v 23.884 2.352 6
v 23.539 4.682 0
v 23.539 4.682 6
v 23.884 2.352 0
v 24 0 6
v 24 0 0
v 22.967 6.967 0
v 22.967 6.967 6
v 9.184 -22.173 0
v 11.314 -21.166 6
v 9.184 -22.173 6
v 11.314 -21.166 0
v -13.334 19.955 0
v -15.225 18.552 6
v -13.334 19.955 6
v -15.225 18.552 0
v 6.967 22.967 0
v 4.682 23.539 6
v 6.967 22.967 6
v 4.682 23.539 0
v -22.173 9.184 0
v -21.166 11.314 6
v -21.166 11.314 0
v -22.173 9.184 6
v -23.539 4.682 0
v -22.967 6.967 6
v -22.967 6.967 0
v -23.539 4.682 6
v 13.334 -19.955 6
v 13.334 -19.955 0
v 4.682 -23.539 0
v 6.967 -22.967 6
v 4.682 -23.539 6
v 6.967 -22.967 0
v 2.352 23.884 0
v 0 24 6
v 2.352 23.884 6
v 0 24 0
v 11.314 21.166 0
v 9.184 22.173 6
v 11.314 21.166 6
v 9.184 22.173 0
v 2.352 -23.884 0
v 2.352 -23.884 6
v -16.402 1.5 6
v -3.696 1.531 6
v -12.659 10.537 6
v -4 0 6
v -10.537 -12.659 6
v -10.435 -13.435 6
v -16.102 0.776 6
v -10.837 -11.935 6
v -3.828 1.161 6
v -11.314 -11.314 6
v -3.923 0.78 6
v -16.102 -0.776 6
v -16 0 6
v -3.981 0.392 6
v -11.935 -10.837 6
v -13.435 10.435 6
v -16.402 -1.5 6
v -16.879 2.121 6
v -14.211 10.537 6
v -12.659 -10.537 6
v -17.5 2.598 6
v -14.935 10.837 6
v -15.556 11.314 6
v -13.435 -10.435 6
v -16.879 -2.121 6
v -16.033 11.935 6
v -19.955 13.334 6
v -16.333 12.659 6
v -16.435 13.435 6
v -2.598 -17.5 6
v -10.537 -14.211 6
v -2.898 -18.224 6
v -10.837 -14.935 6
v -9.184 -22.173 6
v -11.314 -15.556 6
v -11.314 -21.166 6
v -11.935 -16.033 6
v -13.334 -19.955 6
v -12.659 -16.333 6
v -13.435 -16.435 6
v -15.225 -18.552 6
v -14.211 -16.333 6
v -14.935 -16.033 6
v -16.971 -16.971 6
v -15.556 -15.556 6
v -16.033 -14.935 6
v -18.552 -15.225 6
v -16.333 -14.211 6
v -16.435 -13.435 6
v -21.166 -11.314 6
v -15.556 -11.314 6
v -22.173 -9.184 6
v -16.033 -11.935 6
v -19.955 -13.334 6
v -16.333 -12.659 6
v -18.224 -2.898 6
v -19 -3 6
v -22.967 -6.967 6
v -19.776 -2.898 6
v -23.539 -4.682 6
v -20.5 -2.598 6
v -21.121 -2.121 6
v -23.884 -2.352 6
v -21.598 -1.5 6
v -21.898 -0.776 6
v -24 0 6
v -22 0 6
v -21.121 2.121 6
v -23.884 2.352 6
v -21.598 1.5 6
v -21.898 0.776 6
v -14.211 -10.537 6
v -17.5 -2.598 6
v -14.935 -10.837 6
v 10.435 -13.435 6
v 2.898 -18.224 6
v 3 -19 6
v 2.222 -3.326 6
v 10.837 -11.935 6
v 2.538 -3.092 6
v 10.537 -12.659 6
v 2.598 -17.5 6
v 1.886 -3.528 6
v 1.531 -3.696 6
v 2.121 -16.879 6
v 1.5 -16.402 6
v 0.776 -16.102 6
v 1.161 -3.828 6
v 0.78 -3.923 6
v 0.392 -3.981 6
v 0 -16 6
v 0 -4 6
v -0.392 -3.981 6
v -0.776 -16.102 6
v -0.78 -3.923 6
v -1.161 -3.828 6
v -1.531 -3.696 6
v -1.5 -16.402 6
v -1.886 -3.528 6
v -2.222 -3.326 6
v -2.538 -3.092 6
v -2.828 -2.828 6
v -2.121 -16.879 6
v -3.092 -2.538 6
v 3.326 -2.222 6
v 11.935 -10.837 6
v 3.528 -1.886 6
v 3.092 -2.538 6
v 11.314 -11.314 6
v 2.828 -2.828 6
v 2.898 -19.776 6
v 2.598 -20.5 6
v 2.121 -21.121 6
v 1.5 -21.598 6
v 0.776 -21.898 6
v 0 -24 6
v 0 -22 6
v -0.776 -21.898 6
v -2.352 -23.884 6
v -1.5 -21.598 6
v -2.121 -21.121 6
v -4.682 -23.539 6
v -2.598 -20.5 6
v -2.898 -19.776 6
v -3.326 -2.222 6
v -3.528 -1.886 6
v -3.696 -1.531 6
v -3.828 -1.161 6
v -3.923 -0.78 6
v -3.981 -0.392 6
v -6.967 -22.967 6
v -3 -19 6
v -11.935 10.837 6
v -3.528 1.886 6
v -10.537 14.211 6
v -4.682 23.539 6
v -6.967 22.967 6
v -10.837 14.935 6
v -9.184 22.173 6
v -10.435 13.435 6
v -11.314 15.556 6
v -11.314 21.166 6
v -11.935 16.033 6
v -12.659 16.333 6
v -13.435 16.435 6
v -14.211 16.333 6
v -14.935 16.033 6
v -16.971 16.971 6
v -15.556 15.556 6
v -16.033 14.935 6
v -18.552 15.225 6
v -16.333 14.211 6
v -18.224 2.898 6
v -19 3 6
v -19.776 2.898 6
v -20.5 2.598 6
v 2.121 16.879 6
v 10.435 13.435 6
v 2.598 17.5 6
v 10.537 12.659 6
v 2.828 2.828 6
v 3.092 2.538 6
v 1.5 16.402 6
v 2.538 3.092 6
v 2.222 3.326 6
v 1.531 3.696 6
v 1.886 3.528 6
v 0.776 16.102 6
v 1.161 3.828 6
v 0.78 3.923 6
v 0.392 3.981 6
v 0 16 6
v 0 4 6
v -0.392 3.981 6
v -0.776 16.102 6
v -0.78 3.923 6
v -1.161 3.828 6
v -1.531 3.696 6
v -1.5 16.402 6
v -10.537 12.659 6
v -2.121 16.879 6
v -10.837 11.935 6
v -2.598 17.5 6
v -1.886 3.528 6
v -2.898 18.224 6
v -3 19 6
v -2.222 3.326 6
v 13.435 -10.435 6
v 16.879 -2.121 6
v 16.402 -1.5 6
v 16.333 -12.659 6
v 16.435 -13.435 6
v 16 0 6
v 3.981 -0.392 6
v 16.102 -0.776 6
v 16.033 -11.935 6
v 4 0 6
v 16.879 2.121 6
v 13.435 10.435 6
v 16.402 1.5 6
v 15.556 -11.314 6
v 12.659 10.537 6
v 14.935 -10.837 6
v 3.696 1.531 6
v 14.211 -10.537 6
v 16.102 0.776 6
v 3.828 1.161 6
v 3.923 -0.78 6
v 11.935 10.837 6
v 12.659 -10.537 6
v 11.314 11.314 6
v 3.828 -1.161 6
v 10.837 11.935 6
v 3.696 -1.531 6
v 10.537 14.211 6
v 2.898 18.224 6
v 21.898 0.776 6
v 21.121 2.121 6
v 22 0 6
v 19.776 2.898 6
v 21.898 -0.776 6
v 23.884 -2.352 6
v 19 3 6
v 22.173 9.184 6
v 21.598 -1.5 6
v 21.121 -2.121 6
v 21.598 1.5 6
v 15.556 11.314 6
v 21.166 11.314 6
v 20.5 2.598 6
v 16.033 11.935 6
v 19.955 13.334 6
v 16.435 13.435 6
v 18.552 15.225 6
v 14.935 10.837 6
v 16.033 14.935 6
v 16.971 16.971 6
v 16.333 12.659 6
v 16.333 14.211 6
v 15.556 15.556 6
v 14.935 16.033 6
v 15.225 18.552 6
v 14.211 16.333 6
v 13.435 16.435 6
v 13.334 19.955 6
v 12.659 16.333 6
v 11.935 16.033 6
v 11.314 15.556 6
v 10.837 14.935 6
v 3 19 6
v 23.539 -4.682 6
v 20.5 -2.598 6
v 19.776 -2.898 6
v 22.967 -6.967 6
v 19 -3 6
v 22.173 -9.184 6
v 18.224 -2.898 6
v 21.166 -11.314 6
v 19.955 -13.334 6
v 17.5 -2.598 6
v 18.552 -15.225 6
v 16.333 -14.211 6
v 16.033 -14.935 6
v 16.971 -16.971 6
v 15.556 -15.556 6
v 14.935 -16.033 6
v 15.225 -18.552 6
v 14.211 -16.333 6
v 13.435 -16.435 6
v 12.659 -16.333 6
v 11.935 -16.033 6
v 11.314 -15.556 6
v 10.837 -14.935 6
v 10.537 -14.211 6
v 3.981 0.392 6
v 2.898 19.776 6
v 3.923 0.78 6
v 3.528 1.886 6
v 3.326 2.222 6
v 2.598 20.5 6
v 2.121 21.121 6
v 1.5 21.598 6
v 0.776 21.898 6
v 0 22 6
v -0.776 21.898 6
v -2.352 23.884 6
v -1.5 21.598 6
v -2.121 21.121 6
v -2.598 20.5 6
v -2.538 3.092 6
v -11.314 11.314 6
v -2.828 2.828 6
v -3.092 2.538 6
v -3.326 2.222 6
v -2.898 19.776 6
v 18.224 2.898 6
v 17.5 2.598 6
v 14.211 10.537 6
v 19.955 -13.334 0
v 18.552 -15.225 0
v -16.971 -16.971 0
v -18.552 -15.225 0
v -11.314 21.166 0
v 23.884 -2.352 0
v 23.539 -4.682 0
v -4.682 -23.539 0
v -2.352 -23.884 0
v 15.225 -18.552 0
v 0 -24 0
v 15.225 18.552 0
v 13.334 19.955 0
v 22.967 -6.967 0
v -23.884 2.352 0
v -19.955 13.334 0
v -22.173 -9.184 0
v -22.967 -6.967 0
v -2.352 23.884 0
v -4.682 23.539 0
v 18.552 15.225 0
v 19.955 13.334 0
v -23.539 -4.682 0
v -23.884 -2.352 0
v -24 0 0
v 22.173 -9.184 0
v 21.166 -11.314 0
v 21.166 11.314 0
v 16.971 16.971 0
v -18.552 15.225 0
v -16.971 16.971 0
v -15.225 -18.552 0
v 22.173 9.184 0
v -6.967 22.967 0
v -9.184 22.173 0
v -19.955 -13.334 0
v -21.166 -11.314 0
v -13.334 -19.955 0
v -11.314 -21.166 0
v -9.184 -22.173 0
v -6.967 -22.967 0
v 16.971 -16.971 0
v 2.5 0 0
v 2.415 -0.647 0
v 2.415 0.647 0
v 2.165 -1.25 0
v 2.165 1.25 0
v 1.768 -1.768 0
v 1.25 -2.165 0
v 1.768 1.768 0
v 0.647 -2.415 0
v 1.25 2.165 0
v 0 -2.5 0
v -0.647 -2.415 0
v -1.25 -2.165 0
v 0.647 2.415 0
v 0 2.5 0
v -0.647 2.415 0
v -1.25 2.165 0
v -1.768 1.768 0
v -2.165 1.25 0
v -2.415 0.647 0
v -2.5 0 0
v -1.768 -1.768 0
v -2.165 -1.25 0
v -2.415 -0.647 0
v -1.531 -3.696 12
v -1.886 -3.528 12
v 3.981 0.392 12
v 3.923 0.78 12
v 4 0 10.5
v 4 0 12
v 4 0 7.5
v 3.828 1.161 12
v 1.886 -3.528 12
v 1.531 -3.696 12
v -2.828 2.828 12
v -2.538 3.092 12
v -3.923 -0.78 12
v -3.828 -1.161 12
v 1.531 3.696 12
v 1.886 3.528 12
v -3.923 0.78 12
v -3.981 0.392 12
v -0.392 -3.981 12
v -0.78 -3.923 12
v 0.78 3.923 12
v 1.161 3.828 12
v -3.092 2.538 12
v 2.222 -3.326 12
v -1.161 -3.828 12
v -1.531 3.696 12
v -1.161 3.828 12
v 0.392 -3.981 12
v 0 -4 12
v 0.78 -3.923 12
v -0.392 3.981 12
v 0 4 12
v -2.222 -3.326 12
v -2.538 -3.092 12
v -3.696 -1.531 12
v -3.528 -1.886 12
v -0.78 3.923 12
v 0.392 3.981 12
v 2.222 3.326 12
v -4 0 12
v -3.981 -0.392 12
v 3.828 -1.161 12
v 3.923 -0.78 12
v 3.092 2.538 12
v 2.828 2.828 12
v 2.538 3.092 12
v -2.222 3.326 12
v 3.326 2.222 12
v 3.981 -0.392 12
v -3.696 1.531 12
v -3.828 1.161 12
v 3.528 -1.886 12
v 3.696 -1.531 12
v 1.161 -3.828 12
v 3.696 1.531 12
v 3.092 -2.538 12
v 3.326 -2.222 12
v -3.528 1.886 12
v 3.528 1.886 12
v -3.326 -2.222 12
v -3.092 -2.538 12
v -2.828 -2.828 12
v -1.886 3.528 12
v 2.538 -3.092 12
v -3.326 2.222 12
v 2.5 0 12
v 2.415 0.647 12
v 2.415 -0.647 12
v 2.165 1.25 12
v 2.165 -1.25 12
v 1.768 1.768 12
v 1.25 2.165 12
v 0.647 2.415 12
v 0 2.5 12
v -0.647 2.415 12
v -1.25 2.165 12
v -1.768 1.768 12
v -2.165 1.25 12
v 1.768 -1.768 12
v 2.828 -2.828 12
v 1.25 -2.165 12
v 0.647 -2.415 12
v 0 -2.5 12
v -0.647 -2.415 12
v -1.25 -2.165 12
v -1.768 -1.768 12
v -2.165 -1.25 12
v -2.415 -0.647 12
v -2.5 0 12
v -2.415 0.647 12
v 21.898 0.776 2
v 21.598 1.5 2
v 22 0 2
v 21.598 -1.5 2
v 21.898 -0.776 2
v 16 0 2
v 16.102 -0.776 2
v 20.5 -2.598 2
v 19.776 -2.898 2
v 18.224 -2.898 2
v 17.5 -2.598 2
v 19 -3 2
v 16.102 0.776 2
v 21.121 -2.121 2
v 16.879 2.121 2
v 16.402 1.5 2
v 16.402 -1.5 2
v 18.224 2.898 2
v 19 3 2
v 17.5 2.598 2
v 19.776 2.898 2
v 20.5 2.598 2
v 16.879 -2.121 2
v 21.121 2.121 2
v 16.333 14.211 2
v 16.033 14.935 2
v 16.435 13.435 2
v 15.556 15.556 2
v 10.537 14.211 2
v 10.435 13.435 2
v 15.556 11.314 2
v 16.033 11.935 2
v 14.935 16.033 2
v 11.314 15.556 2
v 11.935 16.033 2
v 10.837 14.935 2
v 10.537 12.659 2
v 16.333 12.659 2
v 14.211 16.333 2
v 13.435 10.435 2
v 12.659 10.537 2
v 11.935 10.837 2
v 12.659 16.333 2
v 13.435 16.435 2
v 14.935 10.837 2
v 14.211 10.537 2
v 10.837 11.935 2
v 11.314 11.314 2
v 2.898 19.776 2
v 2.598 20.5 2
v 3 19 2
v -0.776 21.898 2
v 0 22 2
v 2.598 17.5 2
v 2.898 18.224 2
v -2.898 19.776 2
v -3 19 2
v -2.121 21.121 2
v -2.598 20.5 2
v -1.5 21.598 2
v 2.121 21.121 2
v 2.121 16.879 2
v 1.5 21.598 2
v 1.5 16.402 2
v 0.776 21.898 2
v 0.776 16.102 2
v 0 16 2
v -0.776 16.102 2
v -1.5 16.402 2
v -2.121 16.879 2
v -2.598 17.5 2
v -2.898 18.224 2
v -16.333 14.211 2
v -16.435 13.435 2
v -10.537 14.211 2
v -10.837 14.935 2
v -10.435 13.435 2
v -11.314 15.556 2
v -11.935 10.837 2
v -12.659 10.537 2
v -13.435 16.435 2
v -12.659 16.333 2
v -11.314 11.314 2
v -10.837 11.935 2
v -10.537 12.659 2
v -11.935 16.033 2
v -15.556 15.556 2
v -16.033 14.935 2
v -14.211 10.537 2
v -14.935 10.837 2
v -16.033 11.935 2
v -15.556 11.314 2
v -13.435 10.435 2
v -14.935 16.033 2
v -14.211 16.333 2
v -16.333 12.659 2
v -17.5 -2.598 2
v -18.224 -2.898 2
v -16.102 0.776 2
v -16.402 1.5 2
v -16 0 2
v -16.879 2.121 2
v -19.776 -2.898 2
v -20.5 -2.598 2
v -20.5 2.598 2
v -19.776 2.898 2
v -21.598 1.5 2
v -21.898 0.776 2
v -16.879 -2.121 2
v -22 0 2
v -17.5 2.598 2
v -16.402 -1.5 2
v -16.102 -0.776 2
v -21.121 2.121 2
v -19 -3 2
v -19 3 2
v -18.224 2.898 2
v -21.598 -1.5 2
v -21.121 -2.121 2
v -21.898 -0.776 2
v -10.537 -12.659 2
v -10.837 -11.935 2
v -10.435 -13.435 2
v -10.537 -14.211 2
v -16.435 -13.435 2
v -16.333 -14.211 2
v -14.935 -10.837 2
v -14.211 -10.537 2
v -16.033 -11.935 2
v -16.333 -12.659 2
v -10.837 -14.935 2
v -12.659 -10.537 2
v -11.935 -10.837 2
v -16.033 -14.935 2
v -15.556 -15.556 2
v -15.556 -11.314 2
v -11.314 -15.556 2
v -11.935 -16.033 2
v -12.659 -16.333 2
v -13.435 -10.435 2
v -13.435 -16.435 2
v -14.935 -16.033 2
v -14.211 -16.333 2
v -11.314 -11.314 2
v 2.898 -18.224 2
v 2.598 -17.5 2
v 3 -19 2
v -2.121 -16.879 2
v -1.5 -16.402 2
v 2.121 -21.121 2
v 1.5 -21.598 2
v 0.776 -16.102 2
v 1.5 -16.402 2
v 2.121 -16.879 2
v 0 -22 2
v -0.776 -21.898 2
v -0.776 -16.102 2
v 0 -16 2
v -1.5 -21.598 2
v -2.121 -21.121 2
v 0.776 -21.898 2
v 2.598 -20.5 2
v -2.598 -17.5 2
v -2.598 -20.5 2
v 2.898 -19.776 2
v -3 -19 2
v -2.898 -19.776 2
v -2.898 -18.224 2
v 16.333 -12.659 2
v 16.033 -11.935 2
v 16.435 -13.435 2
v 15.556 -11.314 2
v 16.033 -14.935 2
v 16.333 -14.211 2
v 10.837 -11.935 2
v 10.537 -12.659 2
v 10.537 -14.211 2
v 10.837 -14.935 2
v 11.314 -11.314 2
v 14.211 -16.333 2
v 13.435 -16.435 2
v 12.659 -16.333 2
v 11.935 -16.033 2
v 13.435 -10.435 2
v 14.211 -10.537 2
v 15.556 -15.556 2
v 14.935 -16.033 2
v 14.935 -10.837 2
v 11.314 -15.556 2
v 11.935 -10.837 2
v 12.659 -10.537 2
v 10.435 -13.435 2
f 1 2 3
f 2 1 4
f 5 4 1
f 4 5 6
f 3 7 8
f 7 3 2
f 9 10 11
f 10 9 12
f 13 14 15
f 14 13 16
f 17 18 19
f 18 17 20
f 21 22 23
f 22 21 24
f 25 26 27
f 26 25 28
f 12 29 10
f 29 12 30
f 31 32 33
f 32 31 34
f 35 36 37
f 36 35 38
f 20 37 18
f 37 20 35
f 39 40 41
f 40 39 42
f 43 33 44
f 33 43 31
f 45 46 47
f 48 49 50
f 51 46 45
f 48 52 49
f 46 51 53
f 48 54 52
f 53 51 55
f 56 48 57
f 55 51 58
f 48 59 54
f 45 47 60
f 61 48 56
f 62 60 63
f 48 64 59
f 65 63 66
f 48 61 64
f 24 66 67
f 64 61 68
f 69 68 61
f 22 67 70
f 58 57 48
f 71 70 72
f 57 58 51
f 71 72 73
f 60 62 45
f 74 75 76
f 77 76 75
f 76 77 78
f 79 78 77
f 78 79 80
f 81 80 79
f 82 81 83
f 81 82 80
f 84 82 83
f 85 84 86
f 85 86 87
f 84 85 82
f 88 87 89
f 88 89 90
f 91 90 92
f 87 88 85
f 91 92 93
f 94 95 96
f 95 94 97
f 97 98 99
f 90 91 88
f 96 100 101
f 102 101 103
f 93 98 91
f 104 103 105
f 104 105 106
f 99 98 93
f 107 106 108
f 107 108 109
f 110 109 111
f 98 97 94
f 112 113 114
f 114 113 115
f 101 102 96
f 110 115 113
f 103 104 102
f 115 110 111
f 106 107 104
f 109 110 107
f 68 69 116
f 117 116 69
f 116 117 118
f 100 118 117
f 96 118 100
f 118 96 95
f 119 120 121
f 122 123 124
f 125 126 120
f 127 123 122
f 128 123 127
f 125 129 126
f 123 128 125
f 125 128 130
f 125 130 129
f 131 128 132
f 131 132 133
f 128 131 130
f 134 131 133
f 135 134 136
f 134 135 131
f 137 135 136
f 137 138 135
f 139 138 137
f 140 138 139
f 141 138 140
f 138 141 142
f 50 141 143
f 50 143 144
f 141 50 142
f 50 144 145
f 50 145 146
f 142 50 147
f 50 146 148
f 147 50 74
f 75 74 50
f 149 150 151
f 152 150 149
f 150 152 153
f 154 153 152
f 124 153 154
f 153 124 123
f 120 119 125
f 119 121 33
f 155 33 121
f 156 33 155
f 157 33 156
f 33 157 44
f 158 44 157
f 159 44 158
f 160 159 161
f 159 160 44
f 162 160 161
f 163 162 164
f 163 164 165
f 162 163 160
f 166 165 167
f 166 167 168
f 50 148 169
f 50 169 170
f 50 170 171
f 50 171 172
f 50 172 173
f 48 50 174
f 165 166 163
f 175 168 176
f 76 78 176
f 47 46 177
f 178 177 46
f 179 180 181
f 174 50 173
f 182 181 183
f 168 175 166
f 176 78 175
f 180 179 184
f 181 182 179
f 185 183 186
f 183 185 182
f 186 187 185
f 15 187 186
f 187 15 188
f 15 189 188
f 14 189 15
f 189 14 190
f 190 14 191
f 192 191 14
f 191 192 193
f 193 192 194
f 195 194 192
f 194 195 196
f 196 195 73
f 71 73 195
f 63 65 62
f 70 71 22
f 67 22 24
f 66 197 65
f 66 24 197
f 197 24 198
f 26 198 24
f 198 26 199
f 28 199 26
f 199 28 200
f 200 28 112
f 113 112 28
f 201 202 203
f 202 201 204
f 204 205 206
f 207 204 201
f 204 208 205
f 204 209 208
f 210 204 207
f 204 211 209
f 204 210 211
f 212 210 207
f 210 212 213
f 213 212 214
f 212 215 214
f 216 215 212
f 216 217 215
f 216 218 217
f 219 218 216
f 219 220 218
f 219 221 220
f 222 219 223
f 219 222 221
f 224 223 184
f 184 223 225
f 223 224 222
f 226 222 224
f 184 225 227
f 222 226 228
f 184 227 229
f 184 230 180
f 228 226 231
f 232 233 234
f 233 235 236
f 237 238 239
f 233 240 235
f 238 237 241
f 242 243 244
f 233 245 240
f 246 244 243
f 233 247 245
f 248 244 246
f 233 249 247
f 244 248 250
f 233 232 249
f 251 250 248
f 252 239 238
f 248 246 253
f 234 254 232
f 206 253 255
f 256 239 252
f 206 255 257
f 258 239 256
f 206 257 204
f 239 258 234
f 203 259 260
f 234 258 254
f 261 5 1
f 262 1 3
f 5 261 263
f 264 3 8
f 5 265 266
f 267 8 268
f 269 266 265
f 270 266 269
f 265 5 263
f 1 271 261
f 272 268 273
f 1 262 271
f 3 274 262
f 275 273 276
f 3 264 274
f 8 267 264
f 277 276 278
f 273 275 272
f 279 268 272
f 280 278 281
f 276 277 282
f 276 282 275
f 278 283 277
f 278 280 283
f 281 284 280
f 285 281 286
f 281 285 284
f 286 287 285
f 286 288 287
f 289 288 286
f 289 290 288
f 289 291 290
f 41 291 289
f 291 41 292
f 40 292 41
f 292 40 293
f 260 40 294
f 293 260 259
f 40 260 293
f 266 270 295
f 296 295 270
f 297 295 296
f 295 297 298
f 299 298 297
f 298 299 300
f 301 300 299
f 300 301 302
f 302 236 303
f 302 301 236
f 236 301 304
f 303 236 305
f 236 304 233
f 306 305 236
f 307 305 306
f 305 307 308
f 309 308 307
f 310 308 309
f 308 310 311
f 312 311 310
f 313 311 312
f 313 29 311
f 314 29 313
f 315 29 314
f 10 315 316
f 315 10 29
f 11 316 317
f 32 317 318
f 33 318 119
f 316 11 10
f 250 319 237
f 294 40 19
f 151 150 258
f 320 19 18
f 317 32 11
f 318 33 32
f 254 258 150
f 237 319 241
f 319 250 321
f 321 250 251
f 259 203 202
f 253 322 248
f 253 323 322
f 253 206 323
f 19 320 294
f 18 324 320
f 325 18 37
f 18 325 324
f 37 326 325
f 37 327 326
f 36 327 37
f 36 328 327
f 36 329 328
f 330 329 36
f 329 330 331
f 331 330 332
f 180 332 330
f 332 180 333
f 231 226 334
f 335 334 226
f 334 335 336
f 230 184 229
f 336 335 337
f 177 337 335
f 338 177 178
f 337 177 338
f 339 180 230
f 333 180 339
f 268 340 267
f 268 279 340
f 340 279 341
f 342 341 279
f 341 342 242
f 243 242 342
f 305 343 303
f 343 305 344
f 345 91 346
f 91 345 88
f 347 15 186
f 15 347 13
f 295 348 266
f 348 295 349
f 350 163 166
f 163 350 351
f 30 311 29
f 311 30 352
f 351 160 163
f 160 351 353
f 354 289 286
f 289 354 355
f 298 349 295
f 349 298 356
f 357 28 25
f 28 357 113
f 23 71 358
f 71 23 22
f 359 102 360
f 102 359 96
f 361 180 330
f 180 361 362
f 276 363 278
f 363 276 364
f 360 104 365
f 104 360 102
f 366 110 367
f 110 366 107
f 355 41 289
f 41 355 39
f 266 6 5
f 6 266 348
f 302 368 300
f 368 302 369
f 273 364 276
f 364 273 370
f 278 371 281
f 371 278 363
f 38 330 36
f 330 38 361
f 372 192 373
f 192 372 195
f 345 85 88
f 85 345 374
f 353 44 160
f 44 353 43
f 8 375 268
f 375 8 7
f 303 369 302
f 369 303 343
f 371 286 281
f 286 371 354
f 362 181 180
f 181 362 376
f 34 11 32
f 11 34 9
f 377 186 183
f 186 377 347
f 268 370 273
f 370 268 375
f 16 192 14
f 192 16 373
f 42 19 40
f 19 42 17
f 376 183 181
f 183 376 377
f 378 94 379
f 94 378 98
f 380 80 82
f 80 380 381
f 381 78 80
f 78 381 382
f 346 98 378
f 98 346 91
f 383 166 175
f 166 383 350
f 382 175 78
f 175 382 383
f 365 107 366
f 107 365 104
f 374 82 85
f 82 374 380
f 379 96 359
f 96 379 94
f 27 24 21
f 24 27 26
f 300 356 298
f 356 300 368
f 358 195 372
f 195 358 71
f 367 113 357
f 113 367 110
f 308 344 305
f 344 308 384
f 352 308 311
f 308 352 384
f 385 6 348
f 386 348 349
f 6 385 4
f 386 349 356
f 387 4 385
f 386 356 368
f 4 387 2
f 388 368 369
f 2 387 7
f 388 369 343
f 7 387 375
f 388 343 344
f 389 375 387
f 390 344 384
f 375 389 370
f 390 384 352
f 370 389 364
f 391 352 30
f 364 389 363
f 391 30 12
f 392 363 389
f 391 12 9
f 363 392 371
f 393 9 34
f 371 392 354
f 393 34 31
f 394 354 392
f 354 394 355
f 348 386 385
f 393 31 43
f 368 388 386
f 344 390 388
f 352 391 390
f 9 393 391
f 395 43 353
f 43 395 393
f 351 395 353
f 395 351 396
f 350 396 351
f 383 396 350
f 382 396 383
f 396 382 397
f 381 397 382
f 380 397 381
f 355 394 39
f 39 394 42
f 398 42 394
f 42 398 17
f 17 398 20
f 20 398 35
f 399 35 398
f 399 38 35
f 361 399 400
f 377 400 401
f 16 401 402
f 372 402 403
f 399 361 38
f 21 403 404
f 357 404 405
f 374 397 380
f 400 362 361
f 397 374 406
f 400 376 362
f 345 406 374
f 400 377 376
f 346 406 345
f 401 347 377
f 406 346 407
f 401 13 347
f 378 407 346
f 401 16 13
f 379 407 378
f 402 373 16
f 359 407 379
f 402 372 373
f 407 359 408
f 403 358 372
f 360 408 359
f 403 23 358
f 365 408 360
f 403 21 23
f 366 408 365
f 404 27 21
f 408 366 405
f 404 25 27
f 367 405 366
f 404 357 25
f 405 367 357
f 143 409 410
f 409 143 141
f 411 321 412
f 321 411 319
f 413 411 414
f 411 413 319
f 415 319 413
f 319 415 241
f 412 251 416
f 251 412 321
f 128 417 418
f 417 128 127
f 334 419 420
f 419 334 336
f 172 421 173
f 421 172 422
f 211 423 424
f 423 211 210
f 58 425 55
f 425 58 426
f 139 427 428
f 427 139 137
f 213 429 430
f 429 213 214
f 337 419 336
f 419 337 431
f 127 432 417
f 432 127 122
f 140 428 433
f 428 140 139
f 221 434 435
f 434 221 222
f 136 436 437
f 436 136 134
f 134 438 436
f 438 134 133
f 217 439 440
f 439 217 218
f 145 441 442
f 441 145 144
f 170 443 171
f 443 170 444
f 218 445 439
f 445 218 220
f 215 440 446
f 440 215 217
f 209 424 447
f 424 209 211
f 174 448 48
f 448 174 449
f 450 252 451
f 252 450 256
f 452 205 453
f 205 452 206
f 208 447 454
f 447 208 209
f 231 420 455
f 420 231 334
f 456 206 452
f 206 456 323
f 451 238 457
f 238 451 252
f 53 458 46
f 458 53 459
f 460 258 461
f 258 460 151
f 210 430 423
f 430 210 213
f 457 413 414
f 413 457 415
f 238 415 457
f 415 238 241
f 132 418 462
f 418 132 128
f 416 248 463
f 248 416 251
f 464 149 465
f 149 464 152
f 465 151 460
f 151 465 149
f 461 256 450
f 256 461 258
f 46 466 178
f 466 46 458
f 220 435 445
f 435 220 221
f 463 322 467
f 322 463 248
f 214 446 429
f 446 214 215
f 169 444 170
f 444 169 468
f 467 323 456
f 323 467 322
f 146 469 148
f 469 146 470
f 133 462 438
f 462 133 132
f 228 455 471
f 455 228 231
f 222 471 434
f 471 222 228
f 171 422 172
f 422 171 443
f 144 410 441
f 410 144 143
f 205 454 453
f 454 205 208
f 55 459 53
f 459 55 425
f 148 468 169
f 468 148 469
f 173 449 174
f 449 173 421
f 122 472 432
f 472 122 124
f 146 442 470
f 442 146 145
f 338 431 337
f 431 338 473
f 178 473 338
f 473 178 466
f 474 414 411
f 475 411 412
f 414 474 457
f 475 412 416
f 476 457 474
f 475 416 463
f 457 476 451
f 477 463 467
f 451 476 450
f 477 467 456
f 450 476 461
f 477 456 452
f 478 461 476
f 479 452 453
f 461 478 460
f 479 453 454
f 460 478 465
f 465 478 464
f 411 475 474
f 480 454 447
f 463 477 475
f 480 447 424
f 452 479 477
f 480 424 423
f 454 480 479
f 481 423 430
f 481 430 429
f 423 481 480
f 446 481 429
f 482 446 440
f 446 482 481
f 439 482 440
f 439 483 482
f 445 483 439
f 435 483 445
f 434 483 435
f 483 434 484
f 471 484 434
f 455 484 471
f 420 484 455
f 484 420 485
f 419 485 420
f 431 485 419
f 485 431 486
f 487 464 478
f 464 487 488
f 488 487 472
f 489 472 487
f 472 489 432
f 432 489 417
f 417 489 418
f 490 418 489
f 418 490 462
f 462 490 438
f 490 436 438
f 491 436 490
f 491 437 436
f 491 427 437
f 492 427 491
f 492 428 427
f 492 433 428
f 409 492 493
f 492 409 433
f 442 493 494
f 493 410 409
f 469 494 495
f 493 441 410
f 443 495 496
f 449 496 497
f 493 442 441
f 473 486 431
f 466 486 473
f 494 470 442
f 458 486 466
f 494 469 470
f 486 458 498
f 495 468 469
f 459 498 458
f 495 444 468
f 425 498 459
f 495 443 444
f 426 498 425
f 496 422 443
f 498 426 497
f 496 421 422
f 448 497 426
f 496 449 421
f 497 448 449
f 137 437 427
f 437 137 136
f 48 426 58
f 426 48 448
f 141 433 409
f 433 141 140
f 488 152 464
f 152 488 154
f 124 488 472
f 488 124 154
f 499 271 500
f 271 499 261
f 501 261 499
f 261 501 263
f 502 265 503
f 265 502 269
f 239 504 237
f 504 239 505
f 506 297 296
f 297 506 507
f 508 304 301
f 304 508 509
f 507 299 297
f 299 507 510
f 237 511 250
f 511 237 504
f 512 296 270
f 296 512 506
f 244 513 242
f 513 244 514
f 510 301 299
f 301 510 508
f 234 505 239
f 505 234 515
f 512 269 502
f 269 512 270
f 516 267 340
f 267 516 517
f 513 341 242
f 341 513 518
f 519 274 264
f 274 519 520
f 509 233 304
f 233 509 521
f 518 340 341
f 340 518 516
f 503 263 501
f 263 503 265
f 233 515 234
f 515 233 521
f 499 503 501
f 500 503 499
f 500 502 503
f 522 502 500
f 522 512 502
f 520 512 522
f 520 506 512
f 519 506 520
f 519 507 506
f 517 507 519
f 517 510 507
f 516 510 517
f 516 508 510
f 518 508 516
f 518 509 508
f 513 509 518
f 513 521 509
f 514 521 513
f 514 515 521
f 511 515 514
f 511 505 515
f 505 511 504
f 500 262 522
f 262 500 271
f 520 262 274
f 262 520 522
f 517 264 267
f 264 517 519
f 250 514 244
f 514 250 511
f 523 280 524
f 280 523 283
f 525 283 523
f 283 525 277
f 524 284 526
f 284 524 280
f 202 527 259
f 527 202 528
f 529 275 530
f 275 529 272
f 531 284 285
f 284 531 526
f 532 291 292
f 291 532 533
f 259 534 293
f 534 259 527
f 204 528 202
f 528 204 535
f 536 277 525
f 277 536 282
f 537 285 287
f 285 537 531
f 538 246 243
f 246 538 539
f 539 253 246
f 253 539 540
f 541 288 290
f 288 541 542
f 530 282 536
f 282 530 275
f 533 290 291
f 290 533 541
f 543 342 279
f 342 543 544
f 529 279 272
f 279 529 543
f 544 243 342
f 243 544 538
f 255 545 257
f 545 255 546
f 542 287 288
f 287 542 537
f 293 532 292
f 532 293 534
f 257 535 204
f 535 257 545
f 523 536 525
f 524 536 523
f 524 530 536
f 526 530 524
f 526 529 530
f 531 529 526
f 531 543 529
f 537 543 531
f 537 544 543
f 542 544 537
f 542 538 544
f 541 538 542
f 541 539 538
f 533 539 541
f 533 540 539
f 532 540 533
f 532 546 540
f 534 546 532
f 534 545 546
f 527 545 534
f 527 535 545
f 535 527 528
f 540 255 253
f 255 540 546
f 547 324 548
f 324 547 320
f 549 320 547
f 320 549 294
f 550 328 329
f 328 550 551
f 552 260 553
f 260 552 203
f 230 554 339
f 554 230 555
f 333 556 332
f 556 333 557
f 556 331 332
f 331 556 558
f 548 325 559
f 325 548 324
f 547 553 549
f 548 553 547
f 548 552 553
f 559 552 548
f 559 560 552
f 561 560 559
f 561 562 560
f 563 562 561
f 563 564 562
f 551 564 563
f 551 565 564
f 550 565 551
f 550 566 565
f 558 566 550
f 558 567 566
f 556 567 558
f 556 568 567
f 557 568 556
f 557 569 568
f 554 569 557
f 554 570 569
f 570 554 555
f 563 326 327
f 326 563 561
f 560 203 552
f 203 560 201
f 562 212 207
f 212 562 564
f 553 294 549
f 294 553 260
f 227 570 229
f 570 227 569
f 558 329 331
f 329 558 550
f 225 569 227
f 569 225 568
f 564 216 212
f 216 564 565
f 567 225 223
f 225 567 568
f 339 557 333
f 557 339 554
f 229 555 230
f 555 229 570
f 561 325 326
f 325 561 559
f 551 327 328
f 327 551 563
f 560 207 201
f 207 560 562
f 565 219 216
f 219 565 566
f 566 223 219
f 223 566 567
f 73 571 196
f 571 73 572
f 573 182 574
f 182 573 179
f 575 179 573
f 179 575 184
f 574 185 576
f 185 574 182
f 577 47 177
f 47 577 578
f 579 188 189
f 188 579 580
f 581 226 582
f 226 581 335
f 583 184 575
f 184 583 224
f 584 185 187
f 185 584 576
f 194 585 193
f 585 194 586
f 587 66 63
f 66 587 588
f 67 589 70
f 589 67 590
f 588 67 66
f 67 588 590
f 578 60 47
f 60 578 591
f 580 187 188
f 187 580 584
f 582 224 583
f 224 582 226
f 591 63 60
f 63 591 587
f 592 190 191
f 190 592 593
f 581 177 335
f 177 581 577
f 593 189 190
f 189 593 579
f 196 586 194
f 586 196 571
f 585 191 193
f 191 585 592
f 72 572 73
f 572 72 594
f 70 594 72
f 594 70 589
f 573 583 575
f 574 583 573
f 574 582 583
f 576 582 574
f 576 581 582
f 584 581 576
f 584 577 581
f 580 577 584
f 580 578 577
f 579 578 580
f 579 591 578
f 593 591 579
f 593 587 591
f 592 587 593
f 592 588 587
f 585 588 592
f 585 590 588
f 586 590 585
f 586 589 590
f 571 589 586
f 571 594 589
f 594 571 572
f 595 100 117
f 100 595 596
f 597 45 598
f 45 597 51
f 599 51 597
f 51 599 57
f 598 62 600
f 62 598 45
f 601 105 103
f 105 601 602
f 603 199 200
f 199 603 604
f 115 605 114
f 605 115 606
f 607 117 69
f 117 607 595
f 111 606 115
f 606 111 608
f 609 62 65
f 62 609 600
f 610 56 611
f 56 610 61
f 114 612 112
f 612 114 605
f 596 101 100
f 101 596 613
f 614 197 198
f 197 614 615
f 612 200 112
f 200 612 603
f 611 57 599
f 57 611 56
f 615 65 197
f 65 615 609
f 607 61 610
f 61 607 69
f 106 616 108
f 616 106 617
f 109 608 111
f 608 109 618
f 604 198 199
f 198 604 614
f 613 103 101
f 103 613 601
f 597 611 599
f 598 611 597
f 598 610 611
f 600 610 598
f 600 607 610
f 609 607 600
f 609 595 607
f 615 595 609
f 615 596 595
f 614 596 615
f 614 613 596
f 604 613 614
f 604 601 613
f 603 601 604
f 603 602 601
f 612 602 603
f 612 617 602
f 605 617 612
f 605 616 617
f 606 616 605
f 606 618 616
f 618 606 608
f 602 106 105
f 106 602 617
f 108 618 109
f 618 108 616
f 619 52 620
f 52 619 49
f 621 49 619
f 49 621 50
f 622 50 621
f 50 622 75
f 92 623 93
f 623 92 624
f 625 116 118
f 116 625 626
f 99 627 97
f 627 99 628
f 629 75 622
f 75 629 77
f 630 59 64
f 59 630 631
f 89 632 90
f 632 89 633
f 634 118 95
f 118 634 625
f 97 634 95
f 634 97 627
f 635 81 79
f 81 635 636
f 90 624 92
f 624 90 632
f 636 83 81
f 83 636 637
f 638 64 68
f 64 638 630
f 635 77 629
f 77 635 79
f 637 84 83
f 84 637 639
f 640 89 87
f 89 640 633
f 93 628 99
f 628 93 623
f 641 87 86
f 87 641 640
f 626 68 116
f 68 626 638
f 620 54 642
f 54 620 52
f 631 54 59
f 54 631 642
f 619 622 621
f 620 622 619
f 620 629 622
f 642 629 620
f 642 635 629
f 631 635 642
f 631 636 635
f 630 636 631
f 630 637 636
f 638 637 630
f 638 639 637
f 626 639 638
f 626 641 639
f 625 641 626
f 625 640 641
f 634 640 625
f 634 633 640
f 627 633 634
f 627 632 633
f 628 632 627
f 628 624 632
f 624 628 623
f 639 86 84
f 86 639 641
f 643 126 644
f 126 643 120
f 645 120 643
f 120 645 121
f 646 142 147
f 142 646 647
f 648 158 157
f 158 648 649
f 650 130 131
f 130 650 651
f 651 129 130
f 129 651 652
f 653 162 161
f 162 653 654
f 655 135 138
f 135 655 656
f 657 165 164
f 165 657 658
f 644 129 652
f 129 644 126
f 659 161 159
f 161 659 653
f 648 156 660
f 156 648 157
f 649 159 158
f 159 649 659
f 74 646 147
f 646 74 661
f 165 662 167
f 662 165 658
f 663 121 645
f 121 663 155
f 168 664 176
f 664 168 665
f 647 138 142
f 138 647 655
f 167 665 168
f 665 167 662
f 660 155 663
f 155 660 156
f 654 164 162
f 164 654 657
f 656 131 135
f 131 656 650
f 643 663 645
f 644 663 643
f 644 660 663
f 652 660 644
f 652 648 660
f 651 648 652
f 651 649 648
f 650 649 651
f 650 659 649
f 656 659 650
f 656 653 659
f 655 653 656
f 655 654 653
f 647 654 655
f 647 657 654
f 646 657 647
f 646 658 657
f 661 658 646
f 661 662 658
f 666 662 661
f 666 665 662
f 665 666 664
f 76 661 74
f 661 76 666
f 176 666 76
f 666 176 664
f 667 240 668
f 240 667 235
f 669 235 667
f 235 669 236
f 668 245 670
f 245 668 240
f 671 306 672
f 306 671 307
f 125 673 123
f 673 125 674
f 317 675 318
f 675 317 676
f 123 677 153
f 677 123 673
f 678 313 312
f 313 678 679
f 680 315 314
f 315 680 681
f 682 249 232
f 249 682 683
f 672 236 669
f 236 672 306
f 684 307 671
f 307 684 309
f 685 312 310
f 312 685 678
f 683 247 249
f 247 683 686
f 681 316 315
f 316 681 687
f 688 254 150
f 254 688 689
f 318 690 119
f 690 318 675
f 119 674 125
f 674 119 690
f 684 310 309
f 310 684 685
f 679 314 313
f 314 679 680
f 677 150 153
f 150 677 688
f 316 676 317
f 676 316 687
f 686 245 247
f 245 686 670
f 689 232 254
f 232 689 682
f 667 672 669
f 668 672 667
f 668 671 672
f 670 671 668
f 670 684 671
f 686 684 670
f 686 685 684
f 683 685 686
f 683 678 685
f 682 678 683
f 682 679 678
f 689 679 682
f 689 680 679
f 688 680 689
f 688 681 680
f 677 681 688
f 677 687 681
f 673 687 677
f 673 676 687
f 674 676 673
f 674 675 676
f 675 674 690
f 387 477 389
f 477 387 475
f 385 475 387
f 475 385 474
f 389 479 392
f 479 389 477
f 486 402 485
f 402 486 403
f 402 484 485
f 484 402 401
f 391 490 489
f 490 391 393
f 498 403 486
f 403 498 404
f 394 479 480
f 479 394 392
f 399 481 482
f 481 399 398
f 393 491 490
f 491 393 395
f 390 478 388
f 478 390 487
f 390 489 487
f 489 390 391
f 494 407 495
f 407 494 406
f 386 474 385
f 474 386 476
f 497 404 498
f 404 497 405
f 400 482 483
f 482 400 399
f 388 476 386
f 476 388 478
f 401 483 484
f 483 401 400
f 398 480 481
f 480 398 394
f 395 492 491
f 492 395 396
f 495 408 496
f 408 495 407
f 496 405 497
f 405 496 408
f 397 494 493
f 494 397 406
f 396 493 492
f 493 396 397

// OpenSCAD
// Parametric seed hopper slotted disk for the seed dispenser.
// 8-slot Geneva-style wheel: one seed drops per slot revolution.
// Driven by a 28BYJ-48 stepper (4096 steps/rev) via ULN2003 driver.
// Issue #77: Rilascio semi e copertura.
// Print in PETG for UV resistance; use 0.2 mm layer height for clean slot edges.

// Parameters (mm)
disk_outer_dia = 48;       // outer diameter
disk_thick = 6;            // thickness
hub_dia = 8;               // central hub (for stepper shaft coupling)
hub_height = 12;           // hub extends above disk for shaft clamp
slot_count = 8;            // number of seed slots
slot_dia = 6;               // seed pocket diameter (tune for your seed size)
slot_depth = 4;             // how deep each seed pocket is recessed
center_bore = 5;           // bore through the hub for the stepper shaft
set_screw_dia = 3;         // M3 set-screw to lock onto shaft

$fn = 64;
eps = 0.01;

module seed_hopper() {
  difference() {
    union() {
      // main disk body
      cylinder(h = disk_thick, d = disk_outer_dia);
      // hub
      translate([0, 0, 0])
        cylinder(h = hub_height, d = hub_dia);
    }
    // center bore for shaft
    translate([0, 0, -eps])
      cylinder(h = disk_thick + hub_height + 2 * eps, d = center_bore, $fn = 24);

    // set-screw hole
    translate([hub_dia / 2, 0, hub_height - 3])
      rotate([0, 90, 0])
        cylinder(h = hub_dia / 2 + eps, d = set_screw_dia, $fn = 16);

    // seed slots around the perimeter
    for (i = [0 : slot_count - 1]) {
      angle = i * (360 / slot_count);
      slot_r = disk_outer_dia / 2 - slot_dia / 2 - 2;
      translate([slot_r * cos(angle), slot_r * sin(angle), disk_thick - slot_depth])
        cylinder(h = slot_depth + eps, d = slot_dia, $fn = 24);
    }
  }
}

seed_hopper();
// Orient disk-down (hub-up) for printing.
